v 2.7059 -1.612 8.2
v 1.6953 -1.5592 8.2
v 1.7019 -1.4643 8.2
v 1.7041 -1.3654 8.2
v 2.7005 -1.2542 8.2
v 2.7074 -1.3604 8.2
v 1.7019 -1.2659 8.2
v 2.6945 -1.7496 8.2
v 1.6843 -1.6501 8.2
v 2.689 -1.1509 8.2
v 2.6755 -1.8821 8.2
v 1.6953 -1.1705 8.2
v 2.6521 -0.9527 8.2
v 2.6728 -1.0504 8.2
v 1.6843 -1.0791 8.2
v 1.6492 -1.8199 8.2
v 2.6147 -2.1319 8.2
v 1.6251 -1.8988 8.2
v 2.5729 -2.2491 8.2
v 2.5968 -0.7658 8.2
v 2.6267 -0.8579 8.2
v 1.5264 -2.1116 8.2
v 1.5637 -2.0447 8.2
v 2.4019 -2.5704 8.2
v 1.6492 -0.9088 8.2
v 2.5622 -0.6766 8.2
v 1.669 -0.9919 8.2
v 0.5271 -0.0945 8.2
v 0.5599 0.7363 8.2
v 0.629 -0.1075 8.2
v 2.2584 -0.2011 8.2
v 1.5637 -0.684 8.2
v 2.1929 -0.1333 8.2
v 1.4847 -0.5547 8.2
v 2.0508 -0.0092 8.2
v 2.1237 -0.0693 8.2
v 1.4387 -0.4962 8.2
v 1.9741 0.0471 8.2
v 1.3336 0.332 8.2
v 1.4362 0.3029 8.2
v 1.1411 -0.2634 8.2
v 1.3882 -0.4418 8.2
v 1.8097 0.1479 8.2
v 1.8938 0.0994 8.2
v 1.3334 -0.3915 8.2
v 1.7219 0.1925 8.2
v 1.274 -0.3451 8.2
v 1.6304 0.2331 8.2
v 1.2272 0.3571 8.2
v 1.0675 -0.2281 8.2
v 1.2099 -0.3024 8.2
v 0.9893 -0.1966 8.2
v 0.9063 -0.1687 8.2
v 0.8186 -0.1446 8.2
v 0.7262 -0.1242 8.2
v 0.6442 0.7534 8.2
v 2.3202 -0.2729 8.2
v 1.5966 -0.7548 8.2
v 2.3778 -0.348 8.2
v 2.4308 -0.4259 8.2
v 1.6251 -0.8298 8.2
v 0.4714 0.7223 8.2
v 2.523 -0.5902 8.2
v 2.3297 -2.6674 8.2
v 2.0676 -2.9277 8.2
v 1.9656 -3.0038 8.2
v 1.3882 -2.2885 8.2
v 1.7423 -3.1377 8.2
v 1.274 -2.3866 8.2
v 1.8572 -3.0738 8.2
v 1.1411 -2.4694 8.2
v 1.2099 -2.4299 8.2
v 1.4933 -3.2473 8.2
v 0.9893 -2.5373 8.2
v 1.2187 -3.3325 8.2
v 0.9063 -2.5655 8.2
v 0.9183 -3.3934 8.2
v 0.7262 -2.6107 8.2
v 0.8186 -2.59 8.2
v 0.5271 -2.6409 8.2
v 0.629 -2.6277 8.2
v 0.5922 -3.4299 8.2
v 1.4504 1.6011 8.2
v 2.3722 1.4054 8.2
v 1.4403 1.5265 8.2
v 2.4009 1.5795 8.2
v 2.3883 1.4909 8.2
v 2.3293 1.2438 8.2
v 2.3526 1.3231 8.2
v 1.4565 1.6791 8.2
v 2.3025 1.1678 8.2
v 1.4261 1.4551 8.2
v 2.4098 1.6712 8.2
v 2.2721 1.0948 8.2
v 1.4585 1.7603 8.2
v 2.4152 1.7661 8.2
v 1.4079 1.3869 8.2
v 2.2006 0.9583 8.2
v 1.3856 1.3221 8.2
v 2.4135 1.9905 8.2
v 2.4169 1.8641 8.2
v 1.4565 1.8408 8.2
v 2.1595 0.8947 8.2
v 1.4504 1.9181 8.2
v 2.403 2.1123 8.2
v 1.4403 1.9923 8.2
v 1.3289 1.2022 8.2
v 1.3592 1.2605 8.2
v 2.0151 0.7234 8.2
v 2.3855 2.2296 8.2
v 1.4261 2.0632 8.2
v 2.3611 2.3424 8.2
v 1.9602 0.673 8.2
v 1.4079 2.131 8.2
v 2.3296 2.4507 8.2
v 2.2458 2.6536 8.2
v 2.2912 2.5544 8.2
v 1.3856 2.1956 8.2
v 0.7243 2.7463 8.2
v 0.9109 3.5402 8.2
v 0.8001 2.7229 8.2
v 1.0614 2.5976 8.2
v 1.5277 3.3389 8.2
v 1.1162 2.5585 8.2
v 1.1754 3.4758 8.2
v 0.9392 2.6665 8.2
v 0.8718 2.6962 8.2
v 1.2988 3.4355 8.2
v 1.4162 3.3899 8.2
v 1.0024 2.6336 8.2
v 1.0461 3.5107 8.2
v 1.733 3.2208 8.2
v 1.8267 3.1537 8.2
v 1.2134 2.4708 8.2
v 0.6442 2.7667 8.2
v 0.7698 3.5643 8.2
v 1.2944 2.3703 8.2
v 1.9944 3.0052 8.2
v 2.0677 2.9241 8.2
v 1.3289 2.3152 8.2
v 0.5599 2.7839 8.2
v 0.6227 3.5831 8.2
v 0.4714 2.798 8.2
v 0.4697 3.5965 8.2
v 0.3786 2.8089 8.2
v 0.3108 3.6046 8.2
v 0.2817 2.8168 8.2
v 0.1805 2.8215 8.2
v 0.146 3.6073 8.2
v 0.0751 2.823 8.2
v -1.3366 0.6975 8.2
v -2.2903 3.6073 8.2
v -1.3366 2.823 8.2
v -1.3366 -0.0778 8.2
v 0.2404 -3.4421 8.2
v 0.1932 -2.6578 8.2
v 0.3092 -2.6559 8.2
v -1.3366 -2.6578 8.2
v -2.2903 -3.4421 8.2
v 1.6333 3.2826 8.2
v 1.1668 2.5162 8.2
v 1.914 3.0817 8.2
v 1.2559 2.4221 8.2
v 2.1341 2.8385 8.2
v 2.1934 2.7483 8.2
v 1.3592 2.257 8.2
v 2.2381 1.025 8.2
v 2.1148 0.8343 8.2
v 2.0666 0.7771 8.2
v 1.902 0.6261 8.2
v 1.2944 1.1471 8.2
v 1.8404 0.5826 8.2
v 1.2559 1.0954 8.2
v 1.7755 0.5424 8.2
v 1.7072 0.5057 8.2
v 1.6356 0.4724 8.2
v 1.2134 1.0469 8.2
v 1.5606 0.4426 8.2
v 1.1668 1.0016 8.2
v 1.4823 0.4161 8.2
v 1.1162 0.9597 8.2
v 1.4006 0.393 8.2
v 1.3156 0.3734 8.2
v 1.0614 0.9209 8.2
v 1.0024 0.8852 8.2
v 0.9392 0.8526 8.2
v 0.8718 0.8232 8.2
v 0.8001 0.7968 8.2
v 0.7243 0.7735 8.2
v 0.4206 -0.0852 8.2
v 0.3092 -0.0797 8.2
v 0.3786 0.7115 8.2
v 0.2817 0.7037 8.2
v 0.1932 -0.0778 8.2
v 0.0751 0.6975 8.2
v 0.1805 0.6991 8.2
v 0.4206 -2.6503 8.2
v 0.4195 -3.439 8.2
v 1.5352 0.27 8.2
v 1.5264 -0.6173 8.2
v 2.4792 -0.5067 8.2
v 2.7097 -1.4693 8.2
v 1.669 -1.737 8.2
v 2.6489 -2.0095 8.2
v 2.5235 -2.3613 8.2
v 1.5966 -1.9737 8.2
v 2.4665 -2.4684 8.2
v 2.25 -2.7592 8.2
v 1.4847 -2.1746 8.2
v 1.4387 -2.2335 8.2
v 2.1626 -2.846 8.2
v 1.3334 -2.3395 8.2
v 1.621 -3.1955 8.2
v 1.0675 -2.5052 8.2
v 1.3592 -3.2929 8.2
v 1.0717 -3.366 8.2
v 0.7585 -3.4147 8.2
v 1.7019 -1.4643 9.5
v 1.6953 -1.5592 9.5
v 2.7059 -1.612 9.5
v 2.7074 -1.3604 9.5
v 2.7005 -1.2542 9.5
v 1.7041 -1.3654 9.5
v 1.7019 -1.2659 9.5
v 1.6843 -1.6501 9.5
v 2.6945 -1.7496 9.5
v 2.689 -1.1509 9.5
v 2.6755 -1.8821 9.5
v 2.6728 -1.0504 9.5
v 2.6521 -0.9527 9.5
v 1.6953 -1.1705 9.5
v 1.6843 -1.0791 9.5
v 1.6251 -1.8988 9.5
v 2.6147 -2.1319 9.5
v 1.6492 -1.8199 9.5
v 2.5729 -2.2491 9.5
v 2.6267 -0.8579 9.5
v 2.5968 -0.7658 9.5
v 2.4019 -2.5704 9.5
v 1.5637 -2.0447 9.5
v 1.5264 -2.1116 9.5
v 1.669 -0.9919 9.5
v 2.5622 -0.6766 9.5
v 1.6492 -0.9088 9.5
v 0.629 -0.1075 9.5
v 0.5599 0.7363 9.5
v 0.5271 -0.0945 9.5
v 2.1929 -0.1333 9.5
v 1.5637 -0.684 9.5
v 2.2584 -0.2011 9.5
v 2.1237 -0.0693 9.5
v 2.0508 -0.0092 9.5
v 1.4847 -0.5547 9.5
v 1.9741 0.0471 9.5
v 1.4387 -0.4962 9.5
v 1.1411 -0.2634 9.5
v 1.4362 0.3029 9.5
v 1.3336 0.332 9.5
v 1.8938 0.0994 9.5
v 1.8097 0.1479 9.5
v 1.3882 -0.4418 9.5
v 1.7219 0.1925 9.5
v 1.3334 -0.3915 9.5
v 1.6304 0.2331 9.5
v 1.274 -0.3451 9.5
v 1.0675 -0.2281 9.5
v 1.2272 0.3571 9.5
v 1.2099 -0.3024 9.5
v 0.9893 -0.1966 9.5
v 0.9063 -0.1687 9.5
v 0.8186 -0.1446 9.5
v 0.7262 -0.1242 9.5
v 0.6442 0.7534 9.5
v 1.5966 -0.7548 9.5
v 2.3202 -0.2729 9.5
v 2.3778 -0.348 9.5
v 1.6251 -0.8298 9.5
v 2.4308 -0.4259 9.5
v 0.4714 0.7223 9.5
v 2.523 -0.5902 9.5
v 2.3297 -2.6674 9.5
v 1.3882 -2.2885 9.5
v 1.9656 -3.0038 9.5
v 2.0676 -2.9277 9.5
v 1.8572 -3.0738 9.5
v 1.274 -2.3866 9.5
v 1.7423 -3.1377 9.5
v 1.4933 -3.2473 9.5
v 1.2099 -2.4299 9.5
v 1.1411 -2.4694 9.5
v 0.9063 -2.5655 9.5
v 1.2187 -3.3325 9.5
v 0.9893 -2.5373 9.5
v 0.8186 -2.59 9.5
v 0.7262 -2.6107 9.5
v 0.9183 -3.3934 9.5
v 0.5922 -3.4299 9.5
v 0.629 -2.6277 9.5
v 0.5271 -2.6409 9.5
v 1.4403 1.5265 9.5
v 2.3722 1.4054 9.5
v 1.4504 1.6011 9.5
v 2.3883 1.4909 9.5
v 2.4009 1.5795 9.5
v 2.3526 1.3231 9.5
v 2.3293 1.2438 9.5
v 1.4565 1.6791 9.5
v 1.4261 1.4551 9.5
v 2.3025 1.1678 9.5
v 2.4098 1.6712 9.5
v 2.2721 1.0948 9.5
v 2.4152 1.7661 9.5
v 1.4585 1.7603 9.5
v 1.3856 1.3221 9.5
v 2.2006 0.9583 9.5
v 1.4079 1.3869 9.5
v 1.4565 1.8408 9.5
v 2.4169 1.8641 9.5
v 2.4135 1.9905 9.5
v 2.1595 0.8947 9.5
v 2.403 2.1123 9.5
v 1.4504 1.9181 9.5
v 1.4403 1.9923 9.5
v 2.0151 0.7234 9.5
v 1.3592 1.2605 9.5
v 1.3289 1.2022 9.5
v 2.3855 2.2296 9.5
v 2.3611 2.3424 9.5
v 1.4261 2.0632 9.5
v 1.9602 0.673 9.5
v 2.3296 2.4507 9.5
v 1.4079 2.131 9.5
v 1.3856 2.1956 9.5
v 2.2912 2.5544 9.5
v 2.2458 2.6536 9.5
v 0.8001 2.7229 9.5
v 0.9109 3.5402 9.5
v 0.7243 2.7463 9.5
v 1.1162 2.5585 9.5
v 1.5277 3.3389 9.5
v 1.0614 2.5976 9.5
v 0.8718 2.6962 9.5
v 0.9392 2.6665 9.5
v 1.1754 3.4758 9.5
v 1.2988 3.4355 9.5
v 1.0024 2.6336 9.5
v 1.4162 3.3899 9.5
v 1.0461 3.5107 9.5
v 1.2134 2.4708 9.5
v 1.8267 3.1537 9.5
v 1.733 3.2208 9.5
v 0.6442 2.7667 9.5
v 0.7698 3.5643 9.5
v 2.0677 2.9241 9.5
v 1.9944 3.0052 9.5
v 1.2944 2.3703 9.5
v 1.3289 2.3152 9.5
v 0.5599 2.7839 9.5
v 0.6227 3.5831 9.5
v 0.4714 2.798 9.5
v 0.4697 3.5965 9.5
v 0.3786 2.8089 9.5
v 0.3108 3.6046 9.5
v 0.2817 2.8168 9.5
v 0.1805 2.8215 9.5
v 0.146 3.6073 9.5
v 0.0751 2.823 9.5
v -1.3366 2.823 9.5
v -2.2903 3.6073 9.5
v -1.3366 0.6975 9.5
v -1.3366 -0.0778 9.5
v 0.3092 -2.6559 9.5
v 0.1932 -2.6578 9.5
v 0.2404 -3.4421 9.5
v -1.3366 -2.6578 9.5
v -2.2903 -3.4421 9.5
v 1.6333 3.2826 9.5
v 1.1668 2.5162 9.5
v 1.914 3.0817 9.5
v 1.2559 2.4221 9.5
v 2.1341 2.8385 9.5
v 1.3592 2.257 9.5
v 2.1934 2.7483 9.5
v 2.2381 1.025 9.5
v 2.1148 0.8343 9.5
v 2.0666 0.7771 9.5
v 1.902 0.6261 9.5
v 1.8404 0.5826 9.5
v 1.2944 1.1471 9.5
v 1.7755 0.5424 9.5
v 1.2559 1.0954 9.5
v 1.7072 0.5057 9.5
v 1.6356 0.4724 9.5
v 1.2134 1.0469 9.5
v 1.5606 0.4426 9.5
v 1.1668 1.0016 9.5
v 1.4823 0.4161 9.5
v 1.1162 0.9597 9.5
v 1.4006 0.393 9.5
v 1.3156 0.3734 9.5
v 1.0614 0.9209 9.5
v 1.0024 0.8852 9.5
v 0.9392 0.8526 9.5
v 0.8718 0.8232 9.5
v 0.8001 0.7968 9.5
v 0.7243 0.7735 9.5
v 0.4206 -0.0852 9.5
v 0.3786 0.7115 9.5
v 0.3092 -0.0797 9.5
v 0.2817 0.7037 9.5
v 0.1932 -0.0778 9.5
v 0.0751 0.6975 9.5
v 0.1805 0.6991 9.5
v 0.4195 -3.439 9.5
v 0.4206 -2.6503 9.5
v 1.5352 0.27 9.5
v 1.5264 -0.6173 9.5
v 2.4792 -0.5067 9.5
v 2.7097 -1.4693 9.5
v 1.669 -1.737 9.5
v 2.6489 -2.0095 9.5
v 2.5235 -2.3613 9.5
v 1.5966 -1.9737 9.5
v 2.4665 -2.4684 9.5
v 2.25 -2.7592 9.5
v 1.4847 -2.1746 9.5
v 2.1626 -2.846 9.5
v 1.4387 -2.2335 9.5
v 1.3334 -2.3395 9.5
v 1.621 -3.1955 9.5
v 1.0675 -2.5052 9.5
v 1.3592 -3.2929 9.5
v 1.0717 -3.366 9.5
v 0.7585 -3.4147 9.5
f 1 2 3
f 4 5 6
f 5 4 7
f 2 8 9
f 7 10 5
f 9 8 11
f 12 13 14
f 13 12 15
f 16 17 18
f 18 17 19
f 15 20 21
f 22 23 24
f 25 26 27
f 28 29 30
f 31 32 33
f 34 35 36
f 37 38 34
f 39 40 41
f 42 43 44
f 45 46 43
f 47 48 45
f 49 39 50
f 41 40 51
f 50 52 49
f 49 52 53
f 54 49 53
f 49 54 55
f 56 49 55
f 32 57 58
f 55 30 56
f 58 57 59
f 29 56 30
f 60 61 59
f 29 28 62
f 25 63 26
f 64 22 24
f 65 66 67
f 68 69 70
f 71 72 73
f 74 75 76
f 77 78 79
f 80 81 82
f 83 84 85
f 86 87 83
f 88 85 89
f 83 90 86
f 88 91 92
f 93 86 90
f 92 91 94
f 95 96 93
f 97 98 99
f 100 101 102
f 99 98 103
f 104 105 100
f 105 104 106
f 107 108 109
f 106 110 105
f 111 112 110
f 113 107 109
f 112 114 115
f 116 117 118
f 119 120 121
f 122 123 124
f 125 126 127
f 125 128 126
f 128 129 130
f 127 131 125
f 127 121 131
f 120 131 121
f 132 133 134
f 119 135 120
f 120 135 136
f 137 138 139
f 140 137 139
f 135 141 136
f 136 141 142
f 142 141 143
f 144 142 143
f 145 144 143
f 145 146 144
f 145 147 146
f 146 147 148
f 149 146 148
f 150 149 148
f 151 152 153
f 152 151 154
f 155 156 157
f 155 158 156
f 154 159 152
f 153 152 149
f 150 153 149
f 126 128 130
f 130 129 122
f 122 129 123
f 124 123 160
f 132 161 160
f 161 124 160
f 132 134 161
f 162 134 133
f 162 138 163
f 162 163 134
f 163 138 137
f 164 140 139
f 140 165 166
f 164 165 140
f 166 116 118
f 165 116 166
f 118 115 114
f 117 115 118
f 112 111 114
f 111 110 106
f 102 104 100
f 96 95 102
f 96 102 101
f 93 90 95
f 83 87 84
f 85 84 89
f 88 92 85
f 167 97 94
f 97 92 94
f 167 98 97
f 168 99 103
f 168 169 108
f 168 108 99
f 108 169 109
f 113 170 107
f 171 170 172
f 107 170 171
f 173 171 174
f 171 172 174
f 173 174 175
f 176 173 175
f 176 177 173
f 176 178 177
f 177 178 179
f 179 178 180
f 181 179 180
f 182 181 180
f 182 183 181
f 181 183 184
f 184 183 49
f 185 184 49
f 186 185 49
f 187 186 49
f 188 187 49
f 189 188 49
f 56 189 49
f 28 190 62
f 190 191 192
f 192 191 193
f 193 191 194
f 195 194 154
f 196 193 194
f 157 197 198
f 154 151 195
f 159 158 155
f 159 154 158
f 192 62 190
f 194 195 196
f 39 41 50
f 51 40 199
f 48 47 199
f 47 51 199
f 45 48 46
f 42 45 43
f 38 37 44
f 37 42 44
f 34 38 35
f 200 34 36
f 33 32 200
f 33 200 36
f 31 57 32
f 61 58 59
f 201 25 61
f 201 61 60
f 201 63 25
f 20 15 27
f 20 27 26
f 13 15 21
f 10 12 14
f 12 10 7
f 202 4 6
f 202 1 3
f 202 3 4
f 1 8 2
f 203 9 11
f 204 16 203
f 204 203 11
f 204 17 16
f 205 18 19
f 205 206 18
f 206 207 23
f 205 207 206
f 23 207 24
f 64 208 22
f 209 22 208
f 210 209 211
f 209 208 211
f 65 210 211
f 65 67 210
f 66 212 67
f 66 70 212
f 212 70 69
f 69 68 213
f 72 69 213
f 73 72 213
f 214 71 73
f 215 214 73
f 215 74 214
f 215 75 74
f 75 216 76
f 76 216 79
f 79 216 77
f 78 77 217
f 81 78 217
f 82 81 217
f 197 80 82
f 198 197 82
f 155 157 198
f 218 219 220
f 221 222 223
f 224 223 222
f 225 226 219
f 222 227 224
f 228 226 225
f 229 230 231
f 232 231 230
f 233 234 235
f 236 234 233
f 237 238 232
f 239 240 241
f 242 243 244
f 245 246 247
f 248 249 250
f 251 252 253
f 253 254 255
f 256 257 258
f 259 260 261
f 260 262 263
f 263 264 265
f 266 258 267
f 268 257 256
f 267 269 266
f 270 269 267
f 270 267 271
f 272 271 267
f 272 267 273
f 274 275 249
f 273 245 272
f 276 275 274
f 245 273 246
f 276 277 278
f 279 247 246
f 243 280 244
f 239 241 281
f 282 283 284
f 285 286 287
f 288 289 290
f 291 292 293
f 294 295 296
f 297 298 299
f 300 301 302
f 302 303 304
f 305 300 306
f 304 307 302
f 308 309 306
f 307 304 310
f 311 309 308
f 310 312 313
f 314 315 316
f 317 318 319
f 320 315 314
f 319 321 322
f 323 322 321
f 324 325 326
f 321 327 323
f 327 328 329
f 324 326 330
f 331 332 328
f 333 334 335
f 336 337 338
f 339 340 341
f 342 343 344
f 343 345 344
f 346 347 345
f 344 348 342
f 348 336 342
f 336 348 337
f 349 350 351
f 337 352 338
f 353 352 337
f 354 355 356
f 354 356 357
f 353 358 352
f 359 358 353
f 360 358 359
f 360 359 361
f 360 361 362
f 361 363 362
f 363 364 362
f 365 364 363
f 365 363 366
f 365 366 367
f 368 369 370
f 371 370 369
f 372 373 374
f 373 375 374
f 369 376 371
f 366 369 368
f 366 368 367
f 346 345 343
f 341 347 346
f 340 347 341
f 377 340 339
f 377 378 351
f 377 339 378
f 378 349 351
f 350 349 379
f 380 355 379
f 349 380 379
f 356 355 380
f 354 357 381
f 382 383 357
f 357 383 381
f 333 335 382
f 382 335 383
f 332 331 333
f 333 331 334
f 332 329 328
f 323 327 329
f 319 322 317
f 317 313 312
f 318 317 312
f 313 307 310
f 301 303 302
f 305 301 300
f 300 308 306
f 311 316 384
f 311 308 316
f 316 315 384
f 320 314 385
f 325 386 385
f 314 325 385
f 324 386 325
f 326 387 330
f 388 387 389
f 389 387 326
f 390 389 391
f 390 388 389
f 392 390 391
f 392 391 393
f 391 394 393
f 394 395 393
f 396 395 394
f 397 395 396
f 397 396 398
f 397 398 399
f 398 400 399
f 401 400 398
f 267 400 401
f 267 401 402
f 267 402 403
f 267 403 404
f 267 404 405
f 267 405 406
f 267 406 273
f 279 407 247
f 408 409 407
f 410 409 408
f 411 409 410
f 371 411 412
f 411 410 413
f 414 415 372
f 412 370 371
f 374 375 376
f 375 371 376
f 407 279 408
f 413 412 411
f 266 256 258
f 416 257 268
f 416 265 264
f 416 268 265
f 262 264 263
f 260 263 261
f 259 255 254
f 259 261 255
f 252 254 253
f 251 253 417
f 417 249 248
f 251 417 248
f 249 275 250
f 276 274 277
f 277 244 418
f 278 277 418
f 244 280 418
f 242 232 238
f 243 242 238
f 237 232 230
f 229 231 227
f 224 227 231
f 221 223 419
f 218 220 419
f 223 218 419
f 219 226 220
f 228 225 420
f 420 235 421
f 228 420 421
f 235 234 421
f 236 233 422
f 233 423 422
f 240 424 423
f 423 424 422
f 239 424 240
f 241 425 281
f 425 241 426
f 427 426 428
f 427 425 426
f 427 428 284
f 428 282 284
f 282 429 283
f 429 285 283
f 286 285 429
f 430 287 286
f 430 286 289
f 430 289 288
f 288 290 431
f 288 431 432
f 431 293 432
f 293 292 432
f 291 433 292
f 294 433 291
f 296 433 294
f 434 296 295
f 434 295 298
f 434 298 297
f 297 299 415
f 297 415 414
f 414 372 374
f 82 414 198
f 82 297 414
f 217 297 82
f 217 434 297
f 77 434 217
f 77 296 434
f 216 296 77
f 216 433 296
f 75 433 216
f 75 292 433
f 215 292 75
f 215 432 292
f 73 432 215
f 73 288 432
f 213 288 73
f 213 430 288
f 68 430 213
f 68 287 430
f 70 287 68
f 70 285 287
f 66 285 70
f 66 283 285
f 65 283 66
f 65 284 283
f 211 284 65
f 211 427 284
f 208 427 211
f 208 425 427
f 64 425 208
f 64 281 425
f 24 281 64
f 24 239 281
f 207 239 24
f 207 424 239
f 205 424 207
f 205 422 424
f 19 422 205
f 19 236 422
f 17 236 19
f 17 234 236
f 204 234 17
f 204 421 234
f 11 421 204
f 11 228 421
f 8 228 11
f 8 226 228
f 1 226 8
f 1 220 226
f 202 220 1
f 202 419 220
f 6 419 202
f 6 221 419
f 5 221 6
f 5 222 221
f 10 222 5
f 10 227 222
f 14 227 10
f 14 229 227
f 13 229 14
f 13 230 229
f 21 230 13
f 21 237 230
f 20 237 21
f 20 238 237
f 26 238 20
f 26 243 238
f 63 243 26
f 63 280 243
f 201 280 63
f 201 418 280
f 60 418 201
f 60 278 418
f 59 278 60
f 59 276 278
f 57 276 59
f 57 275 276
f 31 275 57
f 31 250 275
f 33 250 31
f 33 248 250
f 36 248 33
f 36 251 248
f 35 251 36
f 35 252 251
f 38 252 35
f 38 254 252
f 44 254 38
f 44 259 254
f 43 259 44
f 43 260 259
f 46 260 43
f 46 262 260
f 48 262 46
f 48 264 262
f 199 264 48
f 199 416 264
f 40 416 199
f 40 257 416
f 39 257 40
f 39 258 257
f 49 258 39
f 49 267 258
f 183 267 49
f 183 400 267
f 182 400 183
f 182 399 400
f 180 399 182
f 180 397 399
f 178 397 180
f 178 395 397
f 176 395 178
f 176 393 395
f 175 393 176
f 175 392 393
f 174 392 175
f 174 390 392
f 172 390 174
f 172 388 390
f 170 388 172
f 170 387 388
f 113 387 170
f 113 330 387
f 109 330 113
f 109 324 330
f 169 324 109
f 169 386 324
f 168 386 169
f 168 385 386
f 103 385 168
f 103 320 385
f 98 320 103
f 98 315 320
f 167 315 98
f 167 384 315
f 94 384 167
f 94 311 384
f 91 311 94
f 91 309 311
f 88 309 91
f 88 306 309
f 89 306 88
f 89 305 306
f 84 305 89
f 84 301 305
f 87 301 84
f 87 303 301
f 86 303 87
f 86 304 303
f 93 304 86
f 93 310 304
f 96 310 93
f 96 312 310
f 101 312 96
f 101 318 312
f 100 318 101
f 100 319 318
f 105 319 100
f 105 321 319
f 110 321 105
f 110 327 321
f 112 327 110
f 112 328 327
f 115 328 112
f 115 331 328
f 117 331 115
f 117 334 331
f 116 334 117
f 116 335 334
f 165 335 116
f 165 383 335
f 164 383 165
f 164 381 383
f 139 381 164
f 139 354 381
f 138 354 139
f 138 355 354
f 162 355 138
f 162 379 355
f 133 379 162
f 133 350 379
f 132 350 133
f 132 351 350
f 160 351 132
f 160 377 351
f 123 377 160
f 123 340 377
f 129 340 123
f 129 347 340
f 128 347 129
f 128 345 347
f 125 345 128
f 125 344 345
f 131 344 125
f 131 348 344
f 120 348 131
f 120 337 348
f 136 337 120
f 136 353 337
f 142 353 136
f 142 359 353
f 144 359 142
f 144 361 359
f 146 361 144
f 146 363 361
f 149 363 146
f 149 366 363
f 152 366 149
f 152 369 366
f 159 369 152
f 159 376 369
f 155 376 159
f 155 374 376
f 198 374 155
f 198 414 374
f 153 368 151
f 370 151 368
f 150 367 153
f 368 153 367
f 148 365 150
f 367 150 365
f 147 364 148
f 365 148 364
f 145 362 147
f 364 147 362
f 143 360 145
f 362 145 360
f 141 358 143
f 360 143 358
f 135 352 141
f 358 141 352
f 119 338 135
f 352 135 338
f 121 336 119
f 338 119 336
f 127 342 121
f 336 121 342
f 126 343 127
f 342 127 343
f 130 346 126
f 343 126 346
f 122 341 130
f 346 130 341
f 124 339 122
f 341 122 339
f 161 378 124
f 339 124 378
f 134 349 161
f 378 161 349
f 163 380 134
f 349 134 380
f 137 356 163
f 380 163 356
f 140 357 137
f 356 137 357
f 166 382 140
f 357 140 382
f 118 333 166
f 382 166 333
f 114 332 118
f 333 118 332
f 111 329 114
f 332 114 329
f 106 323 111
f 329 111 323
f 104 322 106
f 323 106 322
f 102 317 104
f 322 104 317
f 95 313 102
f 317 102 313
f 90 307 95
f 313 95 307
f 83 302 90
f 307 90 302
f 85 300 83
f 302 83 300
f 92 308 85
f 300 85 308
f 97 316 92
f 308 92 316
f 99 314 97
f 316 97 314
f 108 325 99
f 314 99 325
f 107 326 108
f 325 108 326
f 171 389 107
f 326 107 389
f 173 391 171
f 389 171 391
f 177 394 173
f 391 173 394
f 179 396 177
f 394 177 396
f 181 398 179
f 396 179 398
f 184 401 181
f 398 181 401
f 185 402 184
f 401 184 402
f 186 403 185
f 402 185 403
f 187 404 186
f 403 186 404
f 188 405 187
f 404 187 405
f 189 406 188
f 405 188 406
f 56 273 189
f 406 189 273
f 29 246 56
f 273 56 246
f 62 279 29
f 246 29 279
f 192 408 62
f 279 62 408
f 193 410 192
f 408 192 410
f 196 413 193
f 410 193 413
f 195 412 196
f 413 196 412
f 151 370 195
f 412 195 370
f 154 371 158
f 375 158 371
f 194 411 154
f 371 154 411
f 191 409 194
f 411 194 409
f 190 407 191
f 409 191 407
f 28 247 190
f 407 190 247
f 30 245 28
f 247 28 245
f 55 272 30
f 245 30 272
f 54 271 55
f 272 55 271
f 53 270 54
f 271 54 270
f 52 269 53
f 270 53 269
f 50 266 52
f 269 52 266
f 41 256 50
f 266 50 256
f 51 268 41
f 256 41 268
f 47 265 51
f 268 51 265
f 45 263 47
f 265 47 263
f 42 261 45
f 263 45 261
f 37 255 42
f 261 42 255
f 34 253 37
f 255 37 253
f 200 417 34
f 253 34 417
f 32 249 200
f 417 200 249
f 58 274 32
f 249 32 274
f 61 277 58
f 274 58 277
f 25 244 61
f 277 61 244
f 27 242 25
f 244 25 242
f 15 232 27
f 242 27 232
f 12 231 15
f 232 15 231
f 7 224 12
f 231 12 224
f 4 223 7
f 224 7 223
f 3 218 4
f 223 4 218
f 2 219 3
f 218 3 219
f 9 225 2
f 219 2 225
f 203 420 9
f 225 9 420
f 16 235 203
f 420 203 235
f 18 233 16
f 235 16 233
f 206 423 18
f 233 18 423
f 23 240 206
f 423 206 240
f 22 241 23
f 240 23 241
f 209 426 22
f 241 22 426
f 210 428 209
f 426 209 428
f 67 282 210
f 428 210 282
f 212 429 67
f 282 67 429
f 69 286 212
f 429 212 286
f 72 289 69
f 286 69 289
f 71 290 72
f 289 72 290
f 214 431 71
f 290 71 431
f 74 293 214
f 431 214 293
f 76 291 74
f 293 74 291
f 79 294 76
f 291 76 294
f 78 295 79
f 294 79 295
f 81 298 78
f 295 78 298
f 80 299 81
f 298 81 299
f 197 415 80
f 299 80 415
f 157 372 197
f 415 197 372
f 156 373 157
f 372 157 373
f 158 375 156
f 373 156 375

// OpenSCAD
// file: ../modules/homing_bar.scad
function homing_bar_quality_steps(quality, preview_steps, export_steps) =
    quality == "preview" ? preview_steps : export_steps;

module homing_bar_profile(length, width, quality = "export") {
    end_steps = homing_bar_quality_steps(quality, 18, 32);
    cap_length = max(length, width);

    hull() {
        translate([-cap_length / 2 + width / 2, 0])
            circle(d = width, $fn = end_steps);
        translate([ cap_length / 2 - width / 2, 0])
            circle(d = width, $fn = end_steps);
    }
}

module homing_bar_blank(
    length,
    width,
    height,
    base_thickness,
    offset_y,
    base_z,
    quality = "export"
) {
    cap_height = max(height, 0.05);
    contact_height = max(base_thickness, 0.05);
    contact_length = length + contact_height * 1.6;
    contact_width = width + contact_height * 1.2;

    translate([0, offset_y, base_z])
        union() {
            hull() {
                linear_extrude(height = 0.01)
                    homing_bar_profile(contact_length, contact_width, quality);
                translate([0, 0, contact_height])
                    linear_extrude(height = 0.01)
                        homing_bar_profile(length, width, quality);
            }

            translate([0, 0, contact_height])
                linear_extrude(height = cap_height)
                    homing_bar_profile(length, width, quality);
        }
}
// file: ../modules/stem_alps.scad
function positive_alps_stem_dimension(value, minimum = 0.1) = max(value, minimum);

module alps_post(stem_length, stem_width, stem_height, lead_in) {
    safe_length = positive_alps_stem_dimension(stem_length);
    safe_width = positive_alps_stem_dimension(stem_width);
    safe_height = max(stem_height, 0.2);
    safe_lead_in = min(lead_in, safe_length * 0.2, safe_width * 0.3, safe_height * 0.4);

    hull() {
        linear_extrude(height = max(safe_height - safe_lead_in, 0.01))
            square([safe_length, safe_width], center = true);

        translate([0, 0, safe_height - 0.01])
            linear_extrude(height = 0.01)
                square([
                    positive_alps_stem_dimension(safe_length - safe_lead_in * 2),
                    positive_alps_stem_dimension(safe_width - safe_lead_in * 2)
                ], center = true);
    }
}

module stem_alps(
    stem_length = 4.45,
    stem_width = 2.25,
    stem_height = 3.5,
    base_clearance = 0,
    lead_in = 0.12,
    quality = "export"
) {
    translate([0, 0, base_clearance])
        alps_post(stem_length, stem_width, stem_height, lead_in);
}
// file: ../modules/stem_choc_v2.scad
use <stem_mx.scad>

module stem_choc_v2(
    outer_diameter = 5.5,
    stem_height = 6.5,
    base_clearance = 0,
    cross_width_horizontal = 1.25,
    cross_length_horizontal = 4.3,
    cross_width_vertical = 1.35,
    cross_length_vertical = 4.3,
    cross_chamfer = 0.4,
    chamfer_height = 0.6,
    quality = "export"
) {
    stem_mx(
        outer_diameter = outer_diameter,
        stem_height = stem_height,
        base_clearance = base_clearance,
        cross_width_horizontal = cross_width_horizontal,
        cross_length_horizontal = cross_length_horizontal,
        cross_width_vertical = cross_width_vertical,
        cross_length_vertical = cross_length_vertical,
        cross_chamfer = cross_chamfer,
        chamfer_height = chamfer_height,
        quality = quality
    );
}
// file: ../modules/stem_choc_v1.scad
function positive_choc_stem_dimension(value, minimum = 0.1) = max(value, minimum);

module choc_v1_prong(prong_width, prong_depth, prong_height, lead_in) {
    safe_width = positive_choc_stem_dimension(prong_width);
    safe_depth = positive_choc_stem_dimension(prong_depth);
    safe_height = max(prong_height, 0.2);
    safe_lead_in = min(lead_in, safe_width * 0.4, safe_depth * 0.2, safe_height * 0.4);

    hull() {
        linear_extrude(height = max(safe_height - safe_lead_in, 0.01))
            square([safe_width, safe_depth], center = true);

        translate([0, 0, safe_height - 0.01])
            linear_extrude(height = 0.01)
                square([
                    positive_choc_stem_dimension(safe_width - safe_lead_in * 2),
                    positive_choc_stem_dimension(safe_depth - safe_lead_in * 2)
                ], center = true);
    }
}

module stem_choc_v1(
    prong_width = 1.2,
    prong_depth = 3.0,
    prong_spacing = 5.7,
    stem_height = 3.0,
    base_clearance = 0,
    lead_in = 0.12,
    quality = "export"
) {
    for (offset_x = [prong_spacing / 2, -prong_spacing / 2]) {
        translate([offset_x, 0, base_clearance])
            choc_v1_prong(prong_width, prong_depth, stem_height, lead_in);
    }
}
// file: ../modules/stem_mx.scad
function stem_quality_steps(quality, preview_steps, export_steps) =
    quality == "preview" ? preview_steps : export_steps;

module stem_slot(length, width, height) {
    translate([-length / 2, -width / 2, 0])
        cube([length, width, height]);
}

module stem_mx(
    outer_diameter = 5.5,
    stem_height = 4.5,
    base_clearance = 0,
    cross_width_horizontal = 1.25,
    cross_length_horizontal = 4.3,
    cross_width_vertical = 1.35,
    cross_length_vertical = 4.3,
    cross_chamfer = 0.4,
    chamfer_height = 0.6,
    quality = "export"
) {
    outer_steps = stem_quality_steps(quality, 36, 64);
    safe_height = max(stem_height, 0.2);

    difference() {
        translate([0, 0, base_clearance])
            cylinder(d = outer_diameter, h = safe_height, $fn = outer_steps);

        translate([0, 0, base_clearance]) {
            stem_slot(cross_length_horizontal, cross_width_horizontal, safe_height + 1);
            stem_slot(cross_width_vertical, cross_length_vertical, safe_height + 1);
        }

        if (cross_chamfer > 0) {
            translate([0, 0, base_clearance - 0.01])
                hull() {
                    stem_slot(
                        cross_length_horizontal + cross_chamfer * 2,
                        cross_width_horizontal + cross_chamfer * 2,
                        0.01
                    );
                    translate([0, 0, chamfer_height])
                        stem_slot(cross_length_horizontal, cross_width_horizontal, 0.01);
                }

            translate([0, 0, base_clearance - 0.01])
                hull() {
                    stem_slot(
                        cross_width_vertical + cross_chamfer * 2,
                        cross_length_vertical + cross_chamfer * 2,
                        0.01
                    );
                    translate([0, 0, chamfer_height])
                        stem_slot(cross_width_vertical, cross_length_vertical, 0.01);
                }
        }
    }
}
// file: ../modules/legend_block.scad
function legend_text_length(label) = max(len(label), 1);
function legend_is_single_glyph(label) = legend_text_length(label) == 1;
function legend_quality_steps(quality, preview_steps, export_steps) =
    quality == "preview" ? preview_steps : export_steps;
function legend_text_curve_steps(quality = "export") =
    legend_quality_steps(quality, 48, 96);
function legend_text_internal_scale(quality = "export") =
    legend_quality_steps(quality, 6, 10);
function legend_single_glyph_target_width(width, depth) =
    min(width * 0.96, max(depth * 1.25, 4.8));
function legend_text_size(label, width, depth) =
    let(
        width_fit = (width * 1.5) / legend_text_length(label),
        depth_fit = depth * 0.98
    )
    max(min(depth_fit, width_fit), 1.0);

module legend_text_shape(label, size, font_name, curve_steps = 48) {
    text(
        text = label,
        size = size,
        font = font_name,
        halign = "center",
        valign = "center",
        $fn = curve_steps
    );
}

module legend_resized_text_shape(label, size, width, depth, font_name, curve_steps = 48) {
    if (legend_is_single_glyph(label)) {
        resize([legend_single_glyph_target_width(width, depth), 0, 0], auto = [false, true, true])
            legend_text_shape(
                label = label,
                size = size,
                font_name = font_name,
                curve_steps = curve_steps
            );
    } else {
        text(
            text = label,
            size = size,
            font = font_name,
            halign = "center",
            valign = "center",
            $fn = curve_steps
        );
    }
}

// Keep decoration options available across bundled fonts without requiring extra font files.
module legend_text_profile(
    label,
    size,
    width,
    depth,
    font_name,
    outline_delta = 0,
    curve_steps = 48
) {
    if (abs(outline_delta) > 0.0001) {
        offset(delta = outline_delta)
            legend_resized_text_shape(
                label = label,
                size = size,
                width = width,
                depth = depth,
                font_name = font_name,
                curve_steps = curve_steps
            );
    } else {
        legend_resized_text_shape(
            label = label,
            size = size,
            width = width,
            depth = depth,
            font_name = font_name,
            curve_steps = curve_steps
        );
    }
}

module legend_block(
    label,
    width,
    depth,
    height,
    offset_x,
    offset_y,
    base_z,
    font_name = "M PLUS 1:style=Regular",
    underline_enabled = false,
    underline_width = 0,
    underline_thickness = 0,
    underline_offset_y = 0,
    outline_delta = 0,
    quality = "export"
) {
    if (!is_undef(label) && len(label) > 0) {
        size = legend_text_size(label, width, depth);
        curve_steps = legend_text_curve_steps(quality);
        internal_scale = legend_text_internal_scale(quality);

        translate([offset_x, offset_y, base_z])
            linear_extrude(height = height, center = false, convexity = 10)
                // Build glyph outlines at a larger internal scale so the bundled runtime
                // preserves more of the original font curvature before scaling back down.
                scale([1 / internal_scale, 1 / internal_scale, 1])
                    union() {
                        legend_text_profile(
                            label = label,
                            size = size * internal_scale,
                            width = width * internal_scale,
                            depth = depth * internal_scale,
                            font_name = font_name,
                            outline_delta = outline_delta * internal_scale,
                            curve_steps = curve_steps
                        );

                        if (underline_enabled && underline_width > 0 && underline_thickness > 0) {
                            translate([0, underline_offset_y * internal_scale])
                                square(
                                    [underline_width * internal_scale, underline_thickness * internal_scale],
                                    center = true
                                );
                        }
                    }
    }
}
// file: ../presets/standard-1u.scad
default_key_width = 18;
default_key_depth = 18;
default_top_center_height = 9.5;
default_wall_thickness = 1.2;
default_top_scale = 0.84;

default_profile_front_angle = 15;
default_profile_back_angle = 15;
default_profile_left_angle = 10;
default_profile_right_angle = 10;
default_top_thickness = 1.5;
default_bottom_corner_radius = 1.0;
default_top_corner_radius = 1.5;
default_dish_radius = 45;
default_dish_depth = 0;
default_top_pitch_deg = 0;
default_top_roll_deg = 0;

default_legend_text = "A";
default_legend_font_name = "M PLUS 1:style=Regular";
default_legend_underline_enabled = false;
default_legend_underline_width = 0;
default_legend_underline_thickness = 0;
default_legend_underline_offset_y = 0;
default_legend_width = 7.2;
default_legend_depth = 4.0;
default_legend_height = 0;
default_legend_outline_delta = 0;
default_legend_offset_x = 0;
default_legend_offset_y = 0;
default_legend_embed = 0.6;

default_homing_bar_enabled = false;
default_homing_bar_height = 0.6;
default_homing_bar_length = 4;
default_homing_bar_width = 1.58;
default_homing_bar_offset_y = -3.5;
default_homing_bar_base_thickness = 0.35;

default_stem_outer_diameter = 5.5;
default_stem_width = default_stem_outer_diameter;
default_stem_depth = default_stem_outer_diameter;
default_stem_height = 6.5;
default_stem_inset = 0;
default_stem_cross_width_horizontal = 1.25;
default_stem_cross_length_horizontal = 4.3;
default_stem_cross_width_vertical = 1.35;
default_stem_cross_length_vertical = 4.3;
default_stem_cross_chamfer = 0.4;

default_stem_type = "choc_v2";

default_stem_mx_outer_diameter = 5.5;
default_stem_mx_height = 4.5;
default_stem_mx_inset = 0;
default_stem_mx_cross_width_horizontal = default_stem_cross_width_horizontal;
default_stem_mx_cross_length_horizontal = default_stem_cross_length_horizontal;
default_stem_mx_cross_width_vertical = default_stem_cross_width_vertical;
default_stem_mx_cross_length_vertical = default_stem_cross_length_vertical;
default_stem_mx_cross_chamfer = default_stem_cross_chamfer;

default_stem_choc_v2_outer_diameter = default_stem_outer_diameter;
default_stem_choc_v2_height = default_stem_height;
default_stem_choc_v2_inset = default_stem_inset;
default_stem_choc_v2_cross_width_horizontal = default_stem_cross_width_horizontal;
default_stem_choc_v2_cross_length_horizontal = default_stem_cross_length_horizontal;
default_stem_choc_v2_cross_width_vertical = default_stem_cross_width_vertical;
default_stem_choc_v2_cross_length_vertical = default_stem_cross_length_vertical;
default_stem_choc_v2_cross_chamfer = default_stem_cross_chamfer;

default_stem_choc_v1_height = 3.0;
default_stem_choc_v1_inset = 0;
default_stem_choc_v1_prong_width = 1.2;
default_stem_choc_v1_prong_depth = 3.0;
default_stem_choc_v1_prong_spacing = 5.7;
default_stem_choc_v1_lead_in = 0.12;

default_stem_alps_height = 3.5;
default_stem_alps_inset = 0;
default_stem_alps_length = 4.45;
default_stem_alps_width = 2.25;
default_stem_alps_lead_in = 0.12;
// main file
export_target = "legend";

user_key_width = 18;
user_key_depth = 18;
user_top_center_height = 9.5;
user_top_pitch_deg = 0;
user_top_roll_deg = 0;
user_wall_thickness = 1.2;
user_top_scale = 0.84;
user_dish_radius = 45;
user_dish_depth = 0;

user_legend_enabled = true;
user_legend_text = "B";
user_legend_font_name = "M PLUS Rounded 1c";
user_legend_underline_enabled = false;
user_legend_width = 7.2;
user_legend_depth = 4.0;
user_legend_height = 0;
user_legend_embed = 0.6;
user_legend_outline_delta = 0;

user_homing_bar_enabled = false;
user_stem_type = "none";
user_stem_enabled = false;

include <../base/keycap.scad>
